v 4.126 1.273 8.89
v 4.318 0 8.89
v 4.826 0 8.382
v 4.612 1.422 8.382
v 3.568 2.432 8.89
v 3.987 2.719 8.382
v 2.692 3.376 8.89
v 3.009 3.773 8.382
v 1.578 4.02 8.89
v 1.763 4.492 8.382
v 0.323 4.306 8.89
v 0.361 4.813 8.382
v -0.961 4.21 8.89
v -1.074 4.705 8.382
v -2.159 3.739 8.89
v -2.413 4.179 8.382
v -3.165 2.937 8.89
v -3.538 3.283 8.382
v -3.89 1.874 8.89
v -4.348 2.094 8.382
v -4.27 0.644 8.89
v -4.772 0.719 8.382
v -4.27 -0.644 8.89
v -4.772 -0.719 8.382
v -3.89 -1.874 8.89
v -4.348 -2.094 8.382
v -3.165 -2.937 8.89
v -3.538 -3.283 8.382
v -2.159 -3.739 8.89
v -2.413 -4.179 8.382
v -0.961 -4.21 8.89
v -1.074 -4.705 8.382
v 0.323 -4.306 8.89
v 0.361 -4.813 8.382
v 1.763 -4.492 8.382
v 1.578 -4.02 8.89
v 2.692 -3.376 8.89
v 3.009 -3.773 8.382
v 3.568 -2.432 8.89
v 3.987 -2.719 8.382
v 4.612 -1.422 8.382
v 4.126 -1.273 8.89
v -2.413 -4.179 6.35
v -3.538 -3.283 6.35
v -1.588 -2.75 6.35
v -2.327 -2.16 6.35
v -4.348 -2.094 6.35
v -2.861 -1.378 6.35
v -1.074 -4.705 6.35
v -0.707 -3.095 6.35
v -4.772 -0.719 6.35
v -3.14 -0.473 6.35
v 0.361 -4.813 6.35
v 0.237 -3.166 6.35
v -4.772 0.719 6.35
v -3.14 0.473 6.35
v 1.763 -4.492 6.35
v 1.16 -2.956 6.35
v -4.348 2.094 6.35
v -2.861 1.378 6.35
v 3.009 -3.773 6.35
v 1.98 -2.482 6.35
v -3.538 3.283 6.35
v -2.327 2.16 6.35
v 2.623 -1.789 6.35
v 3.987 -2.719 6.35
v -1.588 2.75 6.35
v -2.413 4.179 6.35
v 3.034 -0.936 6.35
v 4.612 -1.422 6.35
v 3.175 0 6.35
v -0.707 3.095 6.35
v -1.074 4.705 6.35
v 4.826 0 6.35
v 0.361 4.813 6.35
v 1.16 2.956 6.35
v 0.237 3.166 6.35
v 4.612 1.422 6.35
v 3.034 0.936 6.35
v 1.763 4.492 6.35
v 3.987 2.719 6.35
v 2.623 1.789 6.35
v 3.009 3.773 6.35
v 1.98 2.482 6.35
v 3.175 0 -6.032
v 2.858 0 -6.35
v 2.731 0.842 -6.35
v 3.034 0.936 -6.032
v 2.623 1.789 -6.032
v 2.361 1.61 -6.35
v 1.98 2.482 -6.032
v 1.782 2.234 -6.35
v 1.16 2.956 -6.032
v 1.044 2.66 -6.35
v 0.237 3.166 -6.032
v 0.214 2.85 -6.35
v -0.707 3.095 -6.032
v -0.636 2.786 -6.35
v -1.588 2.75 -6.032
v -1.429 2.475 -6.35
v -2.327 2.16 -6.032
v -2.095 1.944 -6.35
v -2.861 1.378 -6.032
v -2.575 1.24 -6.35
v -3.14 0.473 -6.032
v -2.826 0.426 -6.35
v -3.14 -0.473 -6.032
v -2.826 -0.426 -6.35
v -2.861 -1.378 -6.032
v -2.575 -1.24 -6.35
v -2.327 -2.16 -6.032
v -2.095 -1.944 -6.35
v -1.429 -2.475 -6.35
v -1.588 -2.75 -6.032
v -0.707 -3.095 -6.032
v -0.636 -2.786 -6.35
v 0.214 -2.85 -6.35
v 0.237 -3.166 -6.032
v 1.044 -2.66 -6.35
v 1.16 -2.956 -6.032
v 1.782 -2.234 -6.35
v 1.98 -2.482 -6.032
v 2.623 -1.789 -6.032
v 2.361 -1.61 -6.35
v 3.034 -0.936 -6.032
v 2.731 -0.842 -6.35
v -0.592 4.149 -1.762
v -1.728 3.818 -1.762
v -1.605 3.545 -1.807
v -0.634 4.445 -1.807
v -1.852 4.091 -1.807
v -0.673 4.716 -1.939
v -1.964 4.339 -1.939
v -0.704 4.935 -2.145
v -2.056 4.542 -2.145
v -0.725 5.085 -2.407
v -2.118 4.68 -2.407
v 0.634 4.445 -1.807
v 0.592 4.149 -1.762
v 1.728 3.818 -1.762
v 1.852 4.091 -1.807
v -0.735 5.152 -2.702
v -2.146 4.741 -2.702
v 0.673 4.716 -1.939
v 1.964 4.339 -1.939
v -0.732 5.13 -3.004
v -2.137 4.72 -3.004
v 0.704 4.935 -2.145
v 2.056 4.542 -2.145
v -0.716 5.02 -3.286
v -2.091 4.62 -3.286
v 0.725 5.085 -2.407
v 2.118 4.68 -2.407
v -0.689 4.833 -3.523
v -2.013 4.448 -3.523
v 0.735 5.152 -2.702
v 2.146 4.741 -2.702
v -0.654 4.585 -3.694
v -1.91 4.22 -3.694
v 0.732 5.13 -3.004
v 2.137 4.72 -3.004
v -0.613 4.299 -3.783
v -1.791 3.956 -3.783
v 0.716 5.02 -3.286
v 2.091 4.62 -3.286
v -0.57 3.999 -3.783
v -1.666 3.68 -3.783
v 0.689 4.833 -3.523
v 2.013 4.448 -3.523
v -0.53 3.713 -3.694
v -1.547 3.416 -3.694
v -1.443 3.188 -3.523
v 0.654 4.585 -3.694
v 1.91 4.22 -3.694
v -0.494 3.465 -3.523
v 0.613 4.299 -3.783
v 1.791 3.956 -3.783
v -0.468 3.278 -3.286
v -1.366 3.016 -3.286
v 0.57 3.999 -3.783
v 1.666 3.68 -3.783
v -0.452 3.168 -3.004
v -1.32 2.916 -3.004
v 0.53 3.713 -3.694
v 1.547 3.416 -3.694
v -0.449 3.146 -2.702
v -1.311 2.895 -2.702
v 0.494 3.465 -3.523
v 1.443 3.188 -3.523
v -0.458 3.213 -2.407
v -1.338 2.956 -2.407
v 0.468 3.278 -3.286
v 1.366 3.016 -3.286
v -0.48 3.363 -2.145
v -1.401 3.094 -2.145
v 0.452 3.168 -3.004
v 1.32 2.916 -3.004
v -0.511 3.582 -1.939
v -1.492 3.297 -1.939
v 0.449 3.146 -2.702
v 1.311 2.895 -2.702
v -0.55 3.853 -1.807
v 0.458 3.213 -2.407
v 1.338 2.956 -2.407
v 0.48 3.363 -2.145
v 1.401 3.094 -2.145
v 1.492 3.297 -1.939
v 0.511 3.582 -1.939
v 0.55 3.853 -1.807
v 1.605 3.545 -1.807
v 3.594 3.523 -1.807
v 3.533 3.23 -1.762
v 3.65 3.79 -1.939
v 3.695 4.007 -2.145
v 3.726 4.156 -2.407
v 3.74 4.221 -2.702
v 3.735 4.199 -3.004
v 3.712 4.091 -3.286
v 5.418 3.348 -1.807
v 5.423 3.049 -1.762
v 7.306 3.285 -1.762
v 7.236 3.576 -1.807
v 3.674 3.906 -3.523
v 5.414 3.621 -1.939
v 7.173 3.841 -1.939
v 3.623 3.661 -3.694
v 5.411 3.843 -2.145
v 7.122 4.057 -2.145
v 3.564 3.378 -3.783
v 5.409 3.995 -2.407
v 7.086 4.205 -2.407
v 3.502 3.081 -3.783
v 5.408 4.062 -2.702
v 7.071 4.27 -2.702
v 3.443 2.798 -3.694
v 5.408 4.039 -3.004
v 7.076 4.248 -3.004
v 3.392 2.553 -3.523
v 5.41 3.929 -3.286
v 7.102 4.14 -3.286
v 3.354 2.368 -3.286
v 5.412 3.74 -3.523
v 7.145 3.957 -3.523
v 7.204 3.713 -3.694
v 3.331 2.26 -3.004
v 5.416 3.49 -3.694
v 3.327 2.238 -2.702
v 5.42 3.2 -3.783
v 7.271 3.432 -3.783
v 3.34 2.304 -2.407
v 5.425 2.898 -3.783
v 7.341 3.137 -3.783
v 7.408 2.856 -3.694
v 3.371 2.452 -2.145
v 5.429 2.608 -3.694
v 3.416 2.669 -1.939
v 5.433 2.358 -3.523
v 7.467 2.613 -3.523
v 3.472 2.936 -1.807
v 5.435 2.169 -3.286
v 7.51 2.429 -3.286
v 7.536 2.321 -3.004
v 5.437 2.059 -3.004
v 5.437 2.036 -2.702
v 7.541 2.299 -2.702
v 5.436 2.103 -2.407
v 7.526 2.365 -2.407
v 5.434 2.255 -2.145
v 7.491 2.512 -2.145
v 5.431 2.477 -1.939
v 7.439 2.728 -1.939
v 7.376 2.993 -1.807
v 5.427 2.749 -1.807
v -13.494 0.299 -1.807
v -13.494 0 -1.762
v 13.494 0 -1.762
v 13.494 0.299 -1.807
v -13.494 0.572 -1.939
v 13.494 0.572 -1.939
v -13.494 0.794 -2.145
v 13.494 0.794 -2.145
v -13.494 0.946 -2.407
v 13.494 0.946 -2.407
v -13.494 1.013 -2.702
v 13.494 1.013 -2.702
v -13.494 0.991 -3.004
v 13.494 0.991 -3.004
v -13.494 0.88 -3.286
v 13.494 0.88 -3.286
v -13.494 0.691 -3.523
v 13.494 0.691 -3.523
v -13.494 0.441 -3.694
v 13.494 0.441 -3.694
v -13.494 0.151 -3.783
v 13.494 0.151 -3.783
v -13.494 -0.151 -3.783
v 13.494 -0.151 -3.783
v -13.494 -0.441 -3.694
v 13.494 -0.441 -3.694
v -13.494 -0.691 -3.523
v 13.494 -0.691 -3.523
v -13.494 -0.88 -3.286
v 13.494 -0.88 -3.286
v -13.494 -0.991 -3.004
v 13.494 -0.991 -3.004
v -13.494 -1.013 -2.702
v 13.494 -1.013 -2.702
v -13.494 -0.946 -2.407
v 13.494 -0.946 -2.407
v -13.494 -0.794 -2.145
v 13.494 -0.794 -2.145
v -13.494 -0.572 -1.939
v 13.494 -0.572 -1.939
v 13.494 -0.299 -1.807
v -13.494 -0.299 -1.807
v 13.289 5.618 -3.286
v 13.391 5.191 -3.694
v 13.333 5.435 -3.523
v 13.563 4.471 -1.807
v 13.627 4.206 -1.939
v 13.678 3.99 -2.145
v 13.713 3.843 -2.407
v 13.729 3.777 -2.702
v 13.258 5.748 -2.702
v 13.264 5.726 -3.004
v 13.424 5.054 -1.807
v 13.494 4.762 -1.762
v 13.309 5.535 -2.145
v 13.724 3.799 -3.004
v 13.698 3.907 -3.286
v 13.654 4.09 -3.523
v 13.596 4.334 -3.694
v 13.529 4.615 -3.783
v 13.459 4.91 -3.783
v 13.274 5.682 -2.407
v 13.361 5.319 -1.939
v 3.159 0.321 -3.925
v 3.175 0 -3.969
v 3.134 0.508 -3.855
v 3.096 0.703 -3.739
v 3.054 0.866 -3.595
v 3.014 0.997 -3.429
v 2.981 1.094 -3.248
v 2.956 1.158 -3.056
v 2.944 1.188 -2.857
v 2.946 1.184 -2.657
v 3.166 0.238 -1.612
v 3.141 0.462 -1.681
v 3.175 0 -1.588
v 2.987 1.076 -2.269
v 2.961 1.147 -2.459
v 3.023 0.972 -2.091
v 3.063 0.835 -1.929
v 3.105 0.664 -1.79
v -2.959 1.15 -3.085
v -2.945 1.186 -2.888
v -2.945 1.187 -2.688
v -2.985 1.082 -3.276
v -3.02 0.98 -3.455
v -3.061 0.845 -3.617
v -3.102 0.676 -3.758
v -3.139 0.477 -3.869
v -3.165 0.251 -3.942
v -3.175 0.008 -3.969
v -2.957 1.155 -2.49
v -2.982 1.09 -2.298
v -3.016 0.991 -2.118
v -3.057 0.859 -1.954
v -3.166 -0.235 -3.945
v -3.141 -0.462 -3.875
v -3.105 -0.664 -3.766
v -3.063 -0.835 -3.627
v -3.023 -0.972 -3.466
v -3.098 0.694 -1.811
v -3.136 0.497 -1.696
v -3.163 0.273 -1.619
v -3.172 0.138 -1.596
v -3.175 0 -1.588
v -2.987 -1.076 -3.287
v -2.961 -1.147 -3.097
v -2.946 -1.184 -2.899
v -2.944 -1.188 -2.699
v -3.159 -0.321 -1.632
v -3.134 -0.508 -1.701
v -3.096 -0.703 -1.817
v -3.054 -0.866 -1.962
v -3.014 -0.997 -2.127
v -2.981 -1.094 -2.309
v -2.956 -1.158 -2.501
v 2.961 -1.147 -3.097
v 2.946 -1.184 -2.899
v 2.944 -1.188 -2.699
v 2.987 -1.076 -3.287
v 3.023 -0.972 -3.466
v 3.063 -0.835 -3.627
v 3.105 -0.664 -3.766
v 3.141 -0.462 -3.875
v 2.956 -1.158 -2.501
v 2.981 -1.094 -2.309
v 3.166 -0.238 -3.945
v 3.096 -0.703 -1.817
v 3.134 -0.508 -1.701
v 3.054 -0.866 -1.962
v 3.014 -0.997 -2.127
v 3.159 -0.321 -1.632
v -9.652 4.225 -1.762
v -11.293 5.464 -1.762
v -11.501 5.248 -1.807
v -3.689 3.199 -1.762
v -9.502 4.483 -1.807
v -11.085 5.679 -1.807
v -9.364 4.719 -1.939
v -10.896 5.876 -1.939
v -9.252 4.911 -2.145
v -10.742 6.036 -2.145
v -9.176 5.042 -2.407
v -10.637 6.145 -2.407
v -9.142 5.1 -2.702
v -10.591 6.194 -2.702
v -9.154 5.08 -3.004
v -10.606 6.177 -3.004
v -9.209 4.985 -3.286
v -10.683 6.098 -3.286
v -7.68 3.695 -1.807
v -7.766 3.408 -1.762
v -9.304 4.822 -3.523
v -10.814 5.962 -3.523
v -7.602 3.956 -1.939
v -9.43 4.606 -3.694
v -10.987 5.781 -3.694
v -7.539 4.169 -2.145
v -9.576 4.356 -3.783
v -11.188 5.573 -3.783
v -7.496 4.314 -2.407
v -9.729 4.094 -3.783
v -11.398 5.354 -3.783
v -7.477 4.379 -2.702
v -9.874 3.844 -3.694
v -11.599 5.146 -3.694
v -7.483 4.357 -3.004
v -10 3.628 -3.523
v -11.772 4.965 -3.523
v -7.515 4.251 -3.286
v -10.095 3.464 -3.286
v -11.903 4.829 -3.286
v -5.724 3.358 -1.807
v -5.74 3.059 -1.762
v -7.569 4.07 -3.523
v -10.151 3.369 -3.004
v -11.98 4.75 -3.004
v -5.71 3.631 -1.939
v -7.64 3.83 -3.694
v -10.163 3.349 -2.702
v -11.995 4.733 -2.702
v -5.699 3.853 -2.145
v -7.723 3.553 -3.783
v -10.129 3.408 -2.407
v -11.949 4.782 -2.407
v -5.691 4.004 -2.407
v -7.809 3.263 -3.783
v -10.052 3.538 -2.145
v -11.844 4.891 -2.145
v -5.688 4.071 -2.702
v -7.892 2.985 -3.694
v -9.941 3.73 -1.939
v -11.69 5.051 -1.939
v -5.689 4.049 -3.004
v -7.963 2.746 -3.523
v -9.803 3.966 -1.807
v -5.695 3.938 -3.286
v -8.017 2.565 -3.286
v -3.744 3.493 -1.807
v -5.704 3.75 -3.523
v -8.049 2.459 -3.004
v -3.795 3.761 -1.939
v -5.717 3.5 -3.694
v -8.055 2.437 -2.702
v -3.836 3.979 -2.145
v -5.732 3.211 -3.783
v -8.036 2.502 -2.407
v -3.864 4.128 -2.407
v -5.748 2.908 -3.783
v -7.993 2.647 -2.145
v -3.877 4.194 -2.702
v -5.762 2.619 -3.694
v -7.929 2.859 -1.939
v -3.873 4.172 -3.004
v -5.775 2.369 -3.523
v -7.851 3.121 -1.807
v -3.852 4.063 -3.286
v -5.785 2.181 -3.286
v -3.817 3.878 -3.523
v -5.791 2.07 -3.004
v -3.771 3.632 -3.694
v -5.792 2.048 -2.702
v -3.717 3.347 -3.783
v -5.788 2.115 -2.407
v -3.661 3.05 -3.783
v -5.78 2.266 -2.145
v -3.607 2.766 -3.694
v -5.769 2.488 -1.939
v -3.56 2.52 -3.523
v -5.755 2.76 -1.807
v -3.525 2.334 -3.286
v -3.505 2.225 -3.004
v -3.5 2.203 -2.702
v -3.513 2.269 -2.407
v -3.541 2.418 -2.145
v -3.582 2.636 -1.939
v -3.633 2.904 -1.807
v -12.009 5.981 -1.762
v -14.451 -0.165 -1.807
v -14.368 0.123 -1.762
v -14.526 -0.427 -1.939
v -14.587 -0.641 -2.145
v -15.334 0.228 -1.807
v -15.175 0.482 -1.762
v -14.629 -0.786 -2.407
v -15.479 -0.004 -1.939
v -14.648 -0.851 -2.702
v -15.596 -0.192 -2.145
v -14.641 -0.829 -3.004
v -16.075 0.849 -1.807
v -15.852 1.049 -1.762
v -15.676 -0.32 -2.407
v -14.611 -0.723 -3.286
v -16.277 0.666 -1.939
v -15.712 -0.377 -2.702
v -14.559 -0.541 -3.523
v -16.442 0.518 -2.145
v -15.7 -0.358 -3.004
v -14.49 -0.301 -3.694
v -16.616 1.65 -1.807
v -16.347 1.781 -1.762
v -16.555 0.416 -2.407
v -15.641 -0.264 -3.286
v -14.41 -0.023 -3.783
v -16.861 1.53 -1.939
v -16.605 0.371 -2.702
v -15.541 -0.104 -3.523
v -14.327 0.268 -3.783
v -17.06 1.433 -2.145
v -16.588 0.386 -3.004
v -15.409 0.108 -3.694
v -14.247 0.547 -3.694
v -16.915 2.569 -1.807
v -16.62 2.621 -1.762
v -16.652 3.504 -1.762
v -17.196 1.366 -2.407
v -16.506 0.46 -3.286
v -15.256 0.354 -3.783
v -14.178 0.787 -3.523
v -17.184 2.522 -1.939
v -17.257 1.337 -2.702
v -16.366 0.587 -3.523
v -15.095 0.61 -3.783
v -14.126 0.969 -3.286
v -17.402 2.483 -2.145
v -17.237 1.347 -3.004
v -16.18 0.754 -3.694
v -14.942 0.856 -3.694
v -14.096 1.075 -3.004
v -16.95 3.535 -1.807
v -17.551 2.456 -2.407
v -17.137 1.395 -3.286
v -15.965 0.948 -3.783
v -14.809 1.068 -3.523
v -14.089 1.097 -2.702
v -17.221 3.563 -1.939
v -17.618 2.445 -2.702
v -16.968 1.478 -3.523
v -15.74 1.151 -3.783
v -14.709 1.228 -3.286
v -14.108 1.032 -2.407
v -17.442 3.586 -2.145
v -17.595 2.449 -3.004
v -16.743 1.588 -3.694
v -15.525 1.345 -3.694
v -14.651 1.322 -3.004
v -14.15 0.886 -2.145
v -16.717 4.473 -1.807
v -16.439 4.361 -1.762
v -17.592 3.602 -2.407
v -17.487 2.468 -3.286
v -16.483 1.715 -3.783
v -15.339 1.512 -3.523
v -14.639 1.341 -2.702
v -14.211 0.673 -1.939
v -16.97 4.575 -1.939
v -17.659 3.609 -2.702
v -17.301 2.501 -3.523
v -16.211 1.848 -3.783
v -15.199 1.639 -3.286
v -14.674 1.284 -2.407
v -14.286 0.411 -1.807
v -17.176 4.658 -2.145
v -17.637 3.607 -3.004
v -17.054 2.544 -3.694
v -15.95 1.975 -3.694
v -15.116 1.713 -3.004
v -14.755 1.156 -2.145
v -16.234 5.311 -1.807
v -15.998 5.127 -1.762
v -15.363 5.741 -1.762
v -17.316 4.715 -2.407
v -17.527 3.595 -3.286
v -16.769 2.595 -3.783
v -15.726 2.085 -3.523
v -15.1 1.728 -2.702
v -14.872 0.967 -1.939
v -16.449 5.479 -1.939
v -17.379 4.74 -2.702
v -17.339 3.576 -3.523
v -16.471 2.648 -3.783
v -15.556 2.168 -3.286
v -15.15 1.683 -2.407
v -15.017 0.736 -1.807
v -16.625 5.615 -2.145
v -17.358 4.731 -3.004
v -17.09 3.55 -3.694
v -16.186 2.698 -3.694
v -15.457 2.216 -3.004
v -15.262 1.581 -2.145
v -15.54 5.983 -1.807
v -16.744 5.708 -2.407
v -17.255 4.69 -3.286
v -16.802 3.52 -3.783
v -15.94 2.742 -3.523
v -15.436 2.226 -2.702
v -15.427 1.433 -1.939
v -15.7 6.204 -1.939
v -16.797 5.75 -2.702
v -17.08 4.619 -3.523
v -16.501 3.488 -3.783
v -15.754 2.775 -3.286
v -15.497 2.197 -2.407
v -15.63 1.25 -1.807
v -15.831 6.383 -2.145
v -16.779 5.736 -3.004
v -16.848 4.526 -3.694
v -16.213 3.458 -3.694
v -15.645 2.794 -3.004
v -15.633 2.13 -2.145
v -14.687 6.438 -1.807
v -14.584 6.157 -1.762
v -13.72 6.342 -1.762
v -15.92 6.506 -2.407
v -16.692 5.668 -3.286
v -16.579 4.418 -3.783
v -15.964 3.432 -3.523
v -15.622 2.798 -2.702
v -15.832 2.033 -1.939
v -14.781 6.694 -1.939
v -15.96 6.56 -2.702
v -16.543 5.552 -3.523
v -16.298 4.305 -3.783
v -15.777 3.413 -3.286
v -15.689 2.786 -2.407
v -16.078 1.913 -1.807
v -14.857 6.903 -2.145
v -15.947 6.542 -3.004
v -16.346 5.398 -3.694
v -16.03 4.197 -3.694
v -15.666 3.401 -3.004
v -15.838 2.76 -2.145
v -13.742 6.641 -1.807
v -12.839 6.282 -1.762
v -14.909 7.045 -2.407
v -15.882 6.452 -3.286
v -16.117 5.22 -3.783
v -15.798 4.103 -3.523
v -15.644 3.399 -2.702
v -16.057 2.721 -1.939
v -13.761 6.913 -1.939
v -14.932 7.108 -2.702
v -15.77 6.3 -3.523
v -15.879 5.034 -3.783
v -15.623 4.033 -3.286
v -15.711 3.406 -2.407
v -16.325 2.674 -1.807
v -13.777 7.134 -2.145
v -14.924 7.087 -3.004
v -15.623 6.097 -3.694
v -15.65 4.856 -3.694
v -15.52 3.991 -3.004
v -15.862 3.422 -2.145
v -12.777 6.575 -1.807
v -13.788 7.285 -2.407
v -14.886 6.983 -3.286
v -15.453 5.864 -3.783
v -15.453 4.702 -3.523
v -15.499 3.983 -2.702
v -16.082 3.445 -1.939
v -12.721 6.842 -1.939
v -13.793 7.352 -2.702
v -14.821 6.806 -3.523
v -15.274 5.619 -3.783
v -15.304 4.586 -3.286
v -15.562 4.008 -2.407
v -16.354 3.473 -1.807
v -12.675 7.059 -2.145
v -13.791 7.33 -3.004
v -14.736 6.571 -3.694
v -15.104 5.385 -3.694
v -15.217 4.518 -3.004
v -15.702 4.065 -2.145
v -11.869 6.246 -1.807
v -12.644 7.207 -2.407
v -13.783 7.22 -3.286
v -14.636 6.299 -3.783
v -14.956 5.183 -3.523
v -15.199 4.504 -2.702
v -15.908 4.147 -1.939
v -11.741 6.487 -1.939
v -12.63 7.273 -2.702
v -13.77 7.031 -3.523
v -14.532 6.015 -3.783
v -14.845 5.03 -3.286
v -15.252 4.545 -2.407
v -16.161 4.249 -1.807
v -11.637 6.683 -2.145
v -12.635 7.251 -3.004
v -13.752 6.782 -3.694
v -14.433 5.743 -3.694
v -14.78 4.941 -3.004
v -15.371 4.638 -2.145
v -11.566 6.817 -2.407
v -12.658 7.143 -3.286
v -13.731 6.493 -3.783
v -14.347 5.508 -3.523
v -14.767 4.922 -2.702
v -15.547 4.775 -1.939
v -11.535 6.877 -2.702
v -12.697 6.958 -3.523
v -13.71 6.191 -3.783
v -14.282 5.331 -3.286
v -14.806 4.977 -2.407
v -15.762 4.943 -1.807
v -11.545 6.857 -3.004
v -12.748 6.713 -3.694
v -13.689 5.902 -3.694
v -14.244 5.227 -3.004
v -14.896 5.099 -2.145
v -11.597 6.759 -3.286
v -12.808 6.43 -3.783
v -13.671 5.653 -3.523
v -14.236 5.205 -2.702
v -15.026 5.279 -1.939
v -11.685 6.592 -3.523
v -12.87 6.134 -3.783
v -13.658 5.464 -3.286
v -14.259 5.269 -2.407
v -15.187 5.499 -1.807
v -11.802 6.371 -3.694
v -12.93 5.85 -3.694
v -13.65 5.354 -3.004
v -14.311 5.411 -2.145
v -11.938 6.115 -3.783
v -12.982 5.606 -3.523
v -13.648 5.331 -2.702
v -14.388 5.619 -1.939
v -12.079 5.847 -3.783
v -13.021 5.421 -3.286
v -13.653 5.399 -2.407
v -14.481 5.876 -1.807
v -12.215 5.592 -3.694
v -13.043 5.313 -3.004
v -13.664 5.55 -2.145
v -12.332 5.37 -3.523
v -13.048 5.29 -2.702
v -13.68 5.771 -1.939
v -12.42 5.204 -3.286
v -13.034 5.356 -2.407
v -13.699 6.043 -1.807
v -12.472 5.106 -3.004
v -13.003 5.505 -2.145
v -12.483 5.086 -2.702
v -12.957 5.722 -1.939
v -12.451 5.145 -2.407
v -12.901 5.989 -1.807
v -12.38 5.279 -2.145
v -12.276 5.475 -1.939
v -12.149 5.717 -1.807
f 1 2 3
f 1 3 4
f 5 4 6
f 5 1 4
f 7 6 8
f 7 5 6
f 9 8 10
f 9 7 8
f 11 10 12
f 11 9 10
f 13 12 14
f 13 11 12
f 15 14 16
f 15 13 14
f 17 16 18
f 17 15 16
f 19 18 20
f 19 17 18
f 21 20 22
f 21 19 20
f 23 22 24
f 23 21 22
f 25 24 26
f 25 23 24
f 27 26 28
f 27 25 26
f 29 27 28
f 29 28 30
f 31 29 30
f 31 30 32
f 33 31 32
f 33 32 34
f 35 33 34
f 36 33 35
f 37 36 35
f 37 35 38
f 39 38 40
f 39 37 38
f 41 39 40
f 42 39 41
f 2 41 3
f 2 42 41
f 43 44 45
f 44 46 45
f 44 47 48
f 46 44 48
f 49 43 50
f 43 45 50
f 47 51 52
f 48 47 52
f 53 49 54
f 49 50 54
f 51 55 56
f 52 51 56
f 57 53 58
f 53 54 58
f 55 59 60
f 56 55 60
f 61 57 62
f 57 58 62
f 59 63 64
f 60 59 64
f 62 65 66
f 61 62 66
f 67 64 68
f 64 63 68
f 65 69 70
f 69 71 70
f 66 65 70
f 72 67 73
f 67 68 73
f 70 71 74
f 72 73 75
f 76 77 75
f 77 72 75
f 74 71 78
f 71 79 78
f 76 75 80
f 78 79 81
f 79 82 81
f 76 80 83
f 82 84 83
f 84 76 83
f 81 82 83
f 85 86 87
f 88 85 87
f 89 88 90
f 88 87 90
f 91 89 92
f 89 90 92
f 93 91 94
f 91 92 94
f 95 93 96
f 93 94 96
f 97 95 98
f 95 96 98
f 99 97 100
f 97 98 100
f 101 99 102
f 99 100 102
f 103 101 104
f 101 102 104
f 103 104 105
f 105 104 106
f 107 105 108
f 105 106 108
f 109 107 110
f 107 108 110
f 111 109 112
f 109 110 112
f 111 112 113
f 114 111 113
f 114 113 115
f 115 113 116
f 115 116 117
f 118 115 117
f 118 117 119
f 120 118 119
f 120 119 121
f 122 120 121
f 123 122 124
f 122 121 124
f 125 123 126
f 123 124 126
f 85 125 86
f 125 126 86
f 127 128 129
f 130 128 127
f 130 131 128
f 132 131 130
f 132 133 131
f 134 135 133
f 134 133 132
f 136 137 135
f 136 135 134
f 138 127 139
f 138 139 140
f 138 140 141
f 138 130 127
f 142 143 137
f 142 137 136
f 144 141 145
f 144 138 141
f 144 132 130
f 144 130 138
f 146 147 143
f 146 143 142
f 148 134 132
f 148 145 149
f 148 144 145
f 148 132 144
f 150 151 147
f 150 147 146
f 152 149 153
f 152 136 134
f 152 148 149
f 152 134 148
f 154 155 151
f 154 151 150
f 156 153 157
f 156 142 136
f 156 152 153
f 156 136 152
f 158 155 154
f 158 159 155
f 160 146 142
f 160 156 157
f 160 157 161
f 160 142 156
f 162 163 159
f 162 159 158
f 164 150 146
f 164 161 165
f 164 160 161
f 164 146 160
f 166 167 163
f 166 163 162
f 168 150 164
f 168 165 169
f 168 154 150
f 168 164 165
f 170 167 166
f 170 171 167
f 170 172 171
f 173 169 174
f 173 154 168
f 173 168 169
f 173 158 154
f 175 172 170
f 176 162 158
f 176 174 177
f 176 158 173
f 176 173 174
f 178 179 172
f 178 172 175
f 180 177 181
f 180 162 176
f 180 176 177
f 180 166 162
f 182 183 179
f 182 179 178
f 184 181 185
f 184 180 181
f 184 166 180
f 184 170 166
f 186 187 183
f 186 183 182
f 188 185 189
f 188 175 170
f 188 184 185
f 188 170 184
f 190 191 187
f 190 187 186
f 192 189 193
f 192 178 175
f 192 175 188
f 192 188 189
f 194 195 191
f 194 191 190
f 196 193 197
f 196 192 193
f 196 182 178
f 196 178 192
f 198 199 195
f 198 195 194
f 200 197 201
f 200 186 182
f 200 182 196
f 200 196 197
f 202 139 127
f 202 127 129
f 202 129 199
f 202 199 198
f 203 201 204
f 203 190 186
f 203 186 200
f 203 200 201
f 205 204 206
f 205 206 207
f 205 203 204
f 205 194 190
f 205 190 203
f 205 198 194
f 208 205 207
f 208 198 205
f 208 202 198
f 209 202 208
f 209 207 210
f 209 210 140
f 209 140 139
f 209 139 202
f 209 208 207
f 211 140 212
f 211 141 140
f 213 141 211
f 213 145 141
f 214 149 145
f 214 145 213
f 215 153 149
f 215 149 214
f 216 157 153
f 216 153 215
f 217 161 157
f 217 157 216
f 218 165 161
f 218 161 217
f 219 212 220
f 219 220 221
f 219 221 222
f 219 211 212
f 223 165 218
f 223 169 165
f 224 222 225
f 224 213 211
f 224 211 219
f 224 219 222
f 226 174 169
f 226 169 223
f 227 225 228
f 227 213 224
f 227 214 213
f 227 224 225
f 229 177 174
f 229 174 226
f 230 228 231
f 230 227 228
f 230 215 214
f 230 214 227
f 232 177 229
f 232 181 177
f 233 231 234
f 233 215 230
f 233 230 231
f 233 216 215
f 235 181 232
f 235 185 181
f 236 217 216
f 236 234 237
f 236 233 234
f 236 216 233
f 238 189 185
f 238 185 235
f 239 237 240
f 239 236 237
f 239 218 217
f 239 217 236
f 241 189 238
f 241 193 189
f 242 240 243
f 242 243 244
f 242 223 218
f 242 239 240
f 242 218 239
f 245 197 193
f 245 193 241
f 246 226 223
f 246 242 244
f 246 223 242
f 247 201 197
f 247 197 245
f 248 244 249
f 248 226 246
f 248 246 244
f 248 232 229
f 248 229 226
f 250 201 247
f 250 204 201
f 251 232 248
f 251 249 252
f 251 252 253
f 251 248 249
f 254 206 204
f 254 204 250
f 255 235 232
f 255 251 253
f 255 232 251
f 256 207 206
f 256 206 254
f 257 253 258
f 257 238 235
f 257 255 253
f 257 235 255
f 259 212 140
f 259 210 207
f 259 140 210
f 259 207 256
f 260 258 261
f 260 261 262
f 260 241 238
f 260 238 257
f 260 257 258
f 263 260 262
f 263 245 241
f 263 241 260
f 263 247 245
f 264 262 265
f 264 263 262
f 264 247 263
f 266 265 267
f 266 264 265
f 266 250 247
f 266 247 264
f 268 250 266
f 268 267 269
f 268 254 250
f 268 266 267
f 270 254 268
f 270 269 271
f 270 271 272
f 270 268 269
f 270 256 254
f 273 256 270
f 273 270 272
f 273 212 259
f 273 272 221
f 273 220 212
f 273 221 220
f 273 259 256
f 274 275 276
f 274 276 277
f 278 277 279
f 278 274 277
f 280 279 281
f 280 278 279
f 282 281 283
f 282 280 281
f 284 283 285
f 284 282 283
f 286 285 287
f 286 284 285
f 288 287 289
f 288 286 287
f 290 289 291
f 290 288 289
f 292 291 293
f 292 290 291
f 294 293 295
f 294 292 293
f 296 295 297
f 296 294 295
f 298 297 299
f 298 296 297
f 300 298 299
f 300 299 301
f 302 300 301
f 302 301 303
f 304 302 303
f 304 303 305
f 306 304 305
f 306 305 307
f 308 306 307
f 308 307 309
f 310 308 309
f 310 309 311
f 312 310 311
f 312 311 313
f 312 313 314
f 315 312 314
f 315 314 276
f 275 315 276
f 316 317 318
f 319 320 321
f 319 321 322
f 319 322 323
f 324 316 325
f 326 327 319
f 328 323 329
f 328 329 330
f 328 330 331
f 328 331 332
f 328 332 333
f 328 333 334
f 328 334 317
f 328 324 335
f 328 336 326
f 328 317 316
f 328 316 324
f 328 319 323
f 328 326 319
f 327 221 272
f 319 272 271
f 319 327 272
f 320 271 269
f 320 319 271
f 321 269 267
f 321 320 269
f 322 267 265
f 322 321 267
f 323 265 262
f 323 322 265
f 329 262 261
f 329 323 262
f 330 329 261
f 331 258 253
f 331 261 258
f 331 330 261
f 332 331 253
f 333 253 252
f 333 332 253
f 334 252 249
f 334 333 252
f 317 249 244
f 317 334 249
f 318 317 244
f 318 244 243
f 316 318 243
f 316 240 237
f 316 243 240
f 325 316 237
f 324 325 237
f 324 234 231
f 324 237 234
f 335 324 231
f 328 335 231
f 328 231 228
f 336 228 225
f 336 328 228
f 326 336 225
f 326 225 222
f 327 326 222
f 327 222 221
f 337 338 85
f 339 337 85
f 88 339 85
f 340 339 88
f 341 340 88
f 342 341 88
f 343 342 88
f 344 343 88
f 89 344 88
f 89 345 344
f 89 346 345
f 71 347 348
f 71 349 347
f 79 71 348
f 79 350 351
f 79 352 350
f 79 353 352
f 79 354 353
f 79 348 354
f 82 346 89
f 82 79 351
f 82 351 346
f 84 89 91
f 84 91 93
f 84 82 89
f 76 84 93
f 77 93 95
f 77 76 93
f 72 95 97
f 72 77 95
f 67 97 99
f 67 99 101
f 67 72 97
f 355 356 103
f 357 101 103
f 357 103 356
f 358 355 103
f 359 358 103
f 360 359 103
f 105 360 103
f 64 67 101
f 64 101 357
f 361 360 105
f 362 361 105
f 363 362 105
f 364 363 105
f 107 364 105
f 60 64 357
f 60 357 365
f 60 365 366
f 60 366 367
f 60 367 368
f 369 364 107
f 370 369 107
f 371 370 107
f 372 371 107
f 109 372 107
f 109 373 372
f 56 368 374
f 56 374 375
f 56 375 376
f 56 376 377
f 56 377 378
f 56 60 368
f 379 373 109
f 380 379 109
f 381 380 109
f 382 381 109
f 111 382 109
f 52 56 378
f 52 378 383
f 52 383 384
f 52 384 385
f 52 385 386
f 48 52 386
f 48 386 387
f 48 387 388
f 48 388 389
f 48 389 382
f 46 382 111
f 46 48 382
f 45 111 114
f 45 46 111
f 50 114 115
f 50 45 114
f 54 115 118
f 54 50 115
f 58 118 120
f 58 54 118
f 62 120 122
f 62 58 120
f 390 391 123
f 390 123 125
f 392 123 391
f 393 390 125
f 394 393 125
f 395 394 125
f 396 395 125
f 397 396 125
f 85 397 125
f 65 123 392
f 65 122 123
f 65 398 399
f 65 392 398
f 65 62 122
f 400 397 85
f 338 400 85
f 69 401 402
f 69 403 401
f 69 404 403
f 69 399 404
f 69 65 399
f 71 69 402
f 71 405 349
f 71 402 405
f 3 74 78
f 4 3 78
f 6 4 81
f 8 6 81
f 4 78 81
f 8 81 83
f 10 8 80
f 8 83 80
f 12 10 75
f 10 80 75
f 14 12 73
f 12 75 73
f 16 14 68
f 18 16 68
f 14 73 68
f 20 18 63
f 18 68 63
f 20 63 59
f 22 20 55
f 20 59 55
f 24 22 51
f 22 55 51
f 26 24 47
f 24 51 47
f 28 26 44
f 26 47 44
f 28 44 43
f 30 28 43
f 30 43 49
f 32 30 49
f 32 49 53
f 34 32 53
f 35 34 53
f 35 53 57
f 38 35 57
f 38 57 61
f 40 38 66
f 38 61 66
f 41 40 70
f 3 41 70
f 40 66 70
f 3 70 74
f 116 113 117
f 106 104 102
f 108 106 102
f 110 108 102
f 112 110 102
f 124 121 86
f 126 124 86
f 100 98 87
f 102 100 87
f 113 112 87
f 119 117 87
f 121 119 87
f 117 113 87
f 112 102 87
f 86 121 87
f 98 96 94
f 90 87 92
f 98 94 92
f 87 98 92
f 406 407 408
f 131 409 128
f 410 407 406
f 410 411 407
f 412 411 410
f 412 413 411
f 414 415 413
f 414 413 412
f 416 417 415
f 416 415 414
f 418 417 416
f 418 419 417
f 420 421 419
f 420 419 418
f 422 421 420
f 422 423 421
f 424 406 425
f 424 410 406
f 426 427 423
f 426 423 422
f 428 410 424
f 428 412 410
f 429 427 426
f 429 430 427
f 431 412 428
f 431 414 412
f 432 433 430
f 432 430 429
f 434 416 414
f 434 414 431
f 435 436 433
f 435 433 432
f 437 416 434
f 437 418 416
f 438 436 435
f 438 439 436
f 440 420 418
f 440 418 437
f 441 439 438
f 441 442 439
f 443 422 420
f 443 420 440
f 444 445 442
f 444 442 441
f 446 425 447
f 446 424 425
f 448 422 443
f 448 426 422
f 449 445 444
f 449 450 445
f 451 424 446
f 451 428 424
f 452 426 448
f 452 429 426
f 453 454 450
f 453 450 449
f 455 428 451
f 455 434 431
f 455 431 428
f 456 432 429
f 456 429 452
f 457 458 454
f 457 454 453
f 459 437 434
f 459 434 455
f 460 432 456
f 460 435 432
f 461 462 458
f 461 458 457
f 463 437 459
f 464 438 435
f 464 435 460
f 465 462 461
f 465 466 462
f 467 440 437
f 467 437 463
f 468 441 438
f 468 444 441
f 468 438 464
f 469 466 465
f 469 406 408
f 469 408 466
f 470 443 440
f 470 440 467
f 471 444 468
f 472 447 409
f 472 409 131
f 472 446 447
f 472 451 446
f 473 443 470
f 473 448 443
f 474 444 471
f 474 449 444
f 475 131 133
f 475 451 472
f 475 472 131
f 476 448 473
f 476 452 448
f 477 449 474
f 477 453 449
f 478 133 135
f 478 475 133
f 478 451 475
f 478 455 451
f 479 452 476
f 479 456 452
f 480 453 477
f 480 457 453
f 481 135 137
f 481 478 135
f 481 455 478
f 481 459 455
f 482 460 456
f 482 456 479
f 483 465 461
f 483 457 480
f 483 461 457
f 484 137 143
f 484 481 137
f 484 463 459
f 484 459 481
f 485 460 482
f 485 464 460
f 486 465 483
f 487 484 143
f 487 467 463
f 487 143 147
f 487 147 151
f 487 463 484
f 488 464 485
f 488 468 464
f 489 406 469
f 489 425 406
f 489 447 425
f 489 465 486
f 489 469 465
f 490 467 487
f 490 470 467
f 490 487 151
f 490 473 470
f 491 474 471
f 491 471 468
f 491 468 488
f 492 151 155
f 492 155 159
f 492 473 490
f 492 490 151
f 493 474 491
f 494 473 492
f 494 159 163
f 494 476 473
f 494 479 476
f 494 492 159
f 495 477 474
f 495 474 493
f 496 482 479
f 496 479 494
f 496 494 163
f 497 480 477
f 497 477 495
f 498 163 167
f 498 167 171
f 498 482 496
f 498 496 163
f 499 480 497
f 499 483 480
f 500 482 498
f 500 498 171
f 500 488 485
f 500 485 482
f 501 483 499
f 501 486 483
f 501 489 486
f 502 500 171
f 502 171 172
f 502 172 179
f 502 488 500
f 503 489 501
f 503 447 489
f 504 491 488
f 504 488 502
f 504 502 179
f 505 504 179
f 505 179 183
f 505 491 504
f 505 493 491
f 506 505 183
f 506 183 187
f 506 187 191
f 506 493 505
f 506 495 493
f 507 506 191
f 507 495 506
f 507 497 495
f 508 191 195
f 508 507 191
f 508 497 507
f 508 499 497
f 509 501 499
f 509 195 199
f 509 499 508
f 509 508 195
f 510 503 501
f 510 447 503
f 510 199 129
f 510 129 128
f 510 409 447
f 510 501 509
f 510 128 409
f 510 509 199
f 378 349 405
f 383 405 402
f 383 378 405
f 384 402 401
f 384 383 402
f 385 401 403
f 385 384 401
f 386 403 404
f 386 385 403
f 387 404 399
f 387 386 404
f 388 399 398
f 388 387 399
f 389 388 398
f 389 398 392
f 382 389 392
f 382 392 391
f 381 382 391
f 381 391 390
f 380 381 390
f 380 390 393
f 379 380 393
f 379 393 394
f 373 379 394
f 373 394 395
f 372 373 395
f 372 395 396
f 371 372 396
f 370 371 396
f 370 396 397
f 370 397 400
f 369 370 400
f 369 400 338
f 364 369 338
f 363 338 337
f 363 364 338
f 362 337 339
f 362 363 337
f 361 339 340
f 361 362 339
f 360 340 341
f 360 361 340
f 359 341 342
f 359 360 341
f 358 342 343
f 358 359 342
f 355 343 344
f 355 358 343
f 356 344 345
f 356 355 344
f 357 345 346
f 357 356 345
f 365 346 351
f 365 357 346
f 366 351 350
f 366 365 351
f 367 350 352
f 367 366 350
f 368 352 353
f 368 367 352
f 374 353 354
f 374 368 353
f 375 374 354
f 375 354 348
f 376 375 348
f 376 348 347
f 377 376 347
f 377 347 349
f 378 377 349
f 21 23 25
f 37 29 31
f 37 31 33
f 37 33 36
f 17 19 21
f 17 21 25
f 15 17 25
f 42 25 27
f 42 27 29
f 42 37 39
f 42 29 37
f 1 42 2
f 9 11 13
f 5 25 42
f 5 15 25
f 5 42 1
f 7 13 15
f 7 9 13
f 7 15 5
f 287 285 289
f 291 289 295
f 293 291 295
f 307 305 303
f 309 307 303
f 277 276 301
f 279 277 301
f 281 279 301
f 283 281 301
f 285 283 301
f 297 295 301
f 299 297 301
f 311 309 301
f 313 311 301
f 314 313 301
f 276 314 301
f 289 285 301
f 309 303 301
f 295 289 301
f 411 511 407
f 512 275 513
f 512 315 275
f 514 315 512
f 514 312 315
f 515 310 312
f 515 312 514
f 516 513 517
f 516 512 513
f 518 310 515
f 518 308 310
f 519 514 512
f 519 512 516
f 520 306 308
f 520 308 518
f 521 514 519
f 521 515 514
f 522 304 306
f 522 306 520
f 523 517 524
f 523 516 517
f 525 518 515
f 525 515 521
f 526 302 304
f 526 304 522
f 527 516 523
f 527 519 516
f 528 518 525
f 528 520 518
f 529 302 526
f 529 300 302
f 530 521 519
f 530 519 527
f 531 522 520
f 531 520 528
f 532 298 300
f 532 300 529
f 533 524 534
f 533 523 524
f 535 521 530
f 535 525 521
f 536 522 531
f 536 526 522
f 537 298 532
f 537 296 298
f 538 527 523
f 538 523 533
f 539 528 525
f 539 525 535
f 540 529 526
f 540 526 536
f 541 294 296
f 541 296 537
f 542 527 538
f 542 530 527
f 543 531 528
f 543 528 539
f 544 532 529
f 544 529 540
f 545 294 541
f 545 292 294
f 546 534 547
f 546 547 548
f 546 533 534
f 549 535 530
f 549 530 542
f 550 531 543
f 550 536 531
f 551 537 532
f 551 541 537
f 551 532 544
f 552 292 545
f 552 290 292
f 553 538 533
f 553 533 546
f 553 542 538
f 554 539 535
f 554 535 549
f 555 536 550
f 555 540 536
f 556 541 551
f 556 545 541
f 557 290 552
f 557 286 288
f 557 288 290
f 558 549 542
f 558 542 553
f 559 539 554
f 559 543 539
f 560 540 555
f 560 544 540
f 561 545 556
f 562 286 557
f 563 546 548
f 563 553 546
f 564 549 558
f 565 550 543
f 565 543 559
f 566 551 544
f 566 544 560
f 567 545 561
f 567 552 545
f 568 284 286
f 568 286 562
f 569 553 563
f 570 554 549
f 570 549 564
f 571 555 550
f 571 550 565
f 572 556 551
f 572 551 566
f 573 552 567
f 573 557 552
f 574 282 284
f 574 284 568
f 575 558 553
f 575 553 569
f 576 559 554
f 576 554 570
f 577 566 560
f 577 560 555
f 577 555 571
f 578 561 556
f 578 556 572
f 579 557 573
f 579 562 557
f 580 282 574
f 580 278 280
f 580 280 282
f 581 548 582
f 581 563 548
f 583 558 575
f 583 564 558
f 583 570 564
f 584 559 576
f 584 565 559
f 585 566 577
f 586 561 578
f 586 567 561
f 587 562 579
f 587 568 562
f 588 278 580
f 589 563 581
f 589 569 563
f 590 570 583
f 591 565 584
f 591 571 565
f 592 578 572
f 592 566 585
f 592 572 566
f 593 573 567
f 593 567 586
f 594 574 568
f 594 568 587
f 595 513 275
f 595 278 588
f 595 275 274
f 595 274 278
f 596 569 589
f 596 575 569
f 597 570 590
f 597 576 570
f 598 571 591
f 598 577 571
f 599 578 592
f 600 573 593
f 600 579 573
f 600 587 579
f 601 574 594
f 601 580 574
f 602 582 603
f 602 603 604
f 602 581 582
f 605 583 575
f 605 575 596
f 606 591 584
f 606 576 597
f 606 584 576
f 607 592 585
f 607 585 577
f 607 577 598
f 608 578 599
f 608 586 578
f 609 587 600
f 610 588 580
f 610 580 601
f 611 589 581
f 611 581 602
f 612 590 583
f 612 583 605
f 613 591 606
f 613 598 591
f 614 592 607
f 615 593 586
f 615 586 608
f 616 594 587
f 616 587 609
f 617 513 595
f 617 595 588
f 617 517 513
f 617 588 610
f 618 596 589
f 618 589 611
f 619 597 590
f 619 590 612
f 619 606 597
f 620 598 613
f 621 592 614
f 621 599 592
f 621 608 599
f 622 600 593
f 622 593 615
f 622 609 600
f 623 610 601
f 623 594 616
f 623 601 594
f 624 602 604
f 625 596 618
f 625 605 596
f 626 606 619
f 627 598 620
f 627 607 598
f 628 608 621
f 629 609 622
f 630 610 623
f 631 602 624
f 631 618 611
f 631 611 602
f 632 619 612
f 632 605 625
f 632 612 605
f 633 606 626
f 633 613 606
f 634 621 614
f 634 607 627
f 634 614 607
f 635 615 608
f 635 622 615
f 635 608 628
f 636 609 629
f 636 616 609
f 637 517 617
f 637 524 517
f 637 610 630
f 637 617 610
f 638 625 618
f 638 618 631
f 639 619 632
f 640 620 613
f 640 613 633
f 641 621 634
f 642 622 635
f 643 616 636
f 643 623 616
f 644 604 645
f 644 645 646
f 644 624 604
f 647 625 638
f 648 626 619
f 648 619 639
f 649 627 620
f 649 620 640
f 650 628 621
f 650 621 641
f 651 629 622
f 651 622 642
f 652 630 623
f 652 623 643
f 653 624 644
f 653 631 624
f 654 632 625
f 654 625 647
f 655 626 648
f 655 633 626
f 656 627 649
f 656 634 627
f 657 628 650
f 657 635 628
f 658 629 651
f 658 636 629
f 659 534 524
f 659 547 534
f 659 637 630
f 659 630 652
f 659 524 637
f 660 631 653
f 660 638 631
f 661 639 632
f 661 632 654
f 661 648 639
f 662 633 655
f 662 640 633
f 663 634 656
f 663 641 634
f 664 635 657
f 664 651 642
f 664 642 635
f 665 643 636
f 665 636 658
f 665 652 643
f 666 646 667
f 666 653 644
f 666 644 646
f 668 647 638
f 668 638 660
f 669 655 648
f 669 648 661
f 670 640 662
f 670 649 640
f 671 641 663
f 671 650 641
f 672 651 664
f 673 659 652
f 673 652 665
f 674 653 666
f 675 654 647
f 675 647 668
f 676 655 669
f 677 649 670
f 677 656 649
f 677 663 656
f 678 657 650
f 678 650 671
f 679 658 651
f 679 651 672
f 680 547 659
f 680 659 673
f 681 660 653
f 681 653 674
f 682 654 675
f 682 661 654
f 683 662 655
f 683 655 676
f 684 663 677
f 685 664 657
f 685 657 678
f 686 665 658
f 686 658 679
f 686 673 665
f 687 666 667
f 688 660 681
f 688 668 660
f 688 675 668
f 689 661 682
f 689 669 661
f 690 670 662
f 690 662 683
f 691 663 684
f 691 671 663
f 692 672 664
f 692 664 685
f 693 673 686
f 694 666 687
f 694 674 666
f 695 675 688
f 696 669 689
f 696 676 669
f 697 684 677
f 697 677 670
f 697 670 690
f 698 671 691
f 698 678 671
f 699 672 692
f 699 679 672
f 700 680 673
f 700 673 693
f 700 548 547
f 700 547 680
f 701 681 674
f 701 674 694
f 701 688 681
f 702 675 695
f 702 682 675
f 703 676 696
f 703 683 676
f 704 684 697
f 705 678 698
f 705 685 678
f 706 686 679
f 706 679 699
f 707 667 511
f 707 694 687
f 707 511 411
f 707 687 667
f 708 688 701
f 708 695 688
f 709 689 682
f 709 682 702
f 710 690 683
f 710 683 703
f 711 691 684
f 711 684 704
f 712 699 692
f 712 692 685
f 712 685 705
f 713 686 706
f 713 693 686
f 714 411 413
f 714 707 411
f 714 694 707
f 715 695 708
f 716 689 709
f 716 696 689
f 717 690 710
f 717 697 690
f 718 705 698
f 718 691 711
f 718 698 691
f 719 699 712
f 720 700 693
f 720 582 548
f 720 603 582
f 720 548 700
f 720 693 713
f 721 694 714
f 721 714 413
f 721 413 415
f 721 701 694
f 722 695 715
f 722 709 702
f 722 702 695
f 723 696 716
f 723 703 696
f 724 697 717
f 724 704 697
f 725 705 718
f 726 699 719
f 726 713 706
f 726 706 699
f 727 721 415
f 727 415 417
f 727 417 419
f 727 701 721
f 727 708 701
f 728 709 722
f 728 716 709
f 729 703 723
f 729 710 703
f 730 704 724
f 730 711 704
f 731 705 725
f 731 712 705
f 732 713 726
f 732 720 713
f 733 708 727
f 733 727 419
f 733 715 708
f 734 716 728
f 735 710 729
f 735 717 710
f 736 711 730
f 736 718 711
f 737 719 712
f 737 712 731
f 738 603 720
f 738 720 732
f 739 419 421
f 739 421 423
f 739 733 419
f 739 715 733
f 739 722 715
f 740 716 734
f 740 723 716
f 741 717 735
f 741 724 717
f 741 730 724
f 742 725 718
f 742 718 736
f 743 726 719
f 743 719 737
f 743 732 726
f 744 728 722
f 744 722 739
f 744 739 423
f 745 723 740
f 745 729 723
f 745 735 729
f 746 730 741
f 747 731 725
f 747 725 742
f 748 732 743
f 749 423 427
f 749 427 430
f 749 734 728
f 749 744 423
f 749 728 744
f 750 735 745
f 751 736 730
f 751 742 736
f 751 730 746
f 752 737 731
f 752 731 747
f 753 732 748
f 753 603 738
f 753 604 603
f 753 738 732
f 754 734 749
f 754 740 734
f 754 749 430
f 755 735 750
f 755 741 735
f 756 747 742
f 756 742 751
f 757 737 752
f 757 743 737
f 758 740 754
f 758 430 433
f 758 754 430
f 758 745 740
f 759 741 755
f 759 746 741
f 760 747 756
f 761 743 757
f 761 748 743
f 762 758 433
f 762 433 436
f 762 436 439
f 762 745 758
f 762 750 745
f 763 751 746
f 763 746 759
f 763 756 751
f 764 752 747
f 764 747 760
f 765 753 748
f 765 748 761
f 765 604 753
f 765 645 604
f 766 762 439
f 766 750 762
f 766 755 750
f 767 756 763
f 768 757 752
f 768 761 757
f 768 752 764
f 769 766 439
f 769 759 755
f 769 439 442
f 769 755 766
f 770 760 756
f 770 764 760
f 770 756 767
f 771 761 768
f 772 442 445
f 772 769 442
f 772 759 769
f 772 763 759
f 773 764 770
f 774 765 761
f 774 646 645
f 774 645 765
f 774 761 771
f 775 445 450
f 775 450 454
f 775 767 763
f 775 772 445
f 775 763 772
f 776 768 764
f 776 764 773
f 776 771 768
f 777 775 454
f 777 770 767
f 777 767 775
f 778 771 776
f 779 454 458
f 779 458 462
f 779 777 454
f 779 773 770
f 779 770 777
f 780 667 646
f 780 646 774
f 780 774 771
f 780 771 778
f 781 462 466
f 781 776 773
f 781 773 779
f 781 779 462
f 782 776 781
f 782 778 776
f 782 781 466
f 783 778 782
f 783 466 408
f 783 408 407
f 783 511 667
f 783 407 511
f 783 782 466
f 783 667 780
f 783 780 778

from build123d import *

# Parameters (mm, degrees)
SKETCH1_R           = 3.175
EXTRUDE1_DEPTH      = 6.35
SKETCH2_R           = 4.826
EXTRUDE2_DEPTH      = 2.54
CHAMFER1_SIZE       = 0.508
EXTRUDE3_DEPTH      = 12.207705028
EXTRUDE3_DEPTH_BACK = 12.207705028
SKETCH3_R           = 1.190625
CHAMFER2_SIZE       = 0.3175
SKETCH7_R           = 1.016


with BuildPart() as part:
    # Sketch1 → Extrude1 (new, symmetric)
    with BuildSketch(Plane.XY):
        Circle(SKETCH1_R)
    extrude(amount=EXTRUDE1_DEPTH, both=True)

    # Sketch2 → Extrude2 (add)
    with BuildSketch(Plane.XY.offset(6.35)):
        Circle(SKETCH2_R)
    extrude(amount=EXTRUDE2_DEPTH)

    # Chamfer1
    chamfer1_edges = [part.edges().sort_by_distance(p)[0] for p in [
        (-4.826, 0, 8.89),
    ]]
    chamfer(chamfer1_edges, length=CHAMFER1_SIZE)

    # Sketch3 → Extrude3 (cut, two sides: drawn at the far end of the back side and taken through both)
    with BuildSketch(Plane(origin=(0, 0, 0), x_dir=(0, 0, -1), z_dir=(1, 0, 0)).offset(-EXTRUDE3_DEPTH_BACK)):
        with Locations(Location((2.778125, 0, 0), (0, 0, 179.999999999))):
            Circle(SKETCH3_R)
    extrude(amount=EXTRUDE3_DEPTH + EXTRUDE3_DEPTH_BACK, mode=Mode.SUBTRACT)

    # Chamfer2
    chamfer2_edges = [part.edges().sort_by_distance(p)[0] for p in [
        (-3.175, 0, -6.35),
    ]]
    chamfer(chamfer2_edges, length=CHAMFER2_SIZE)


with BuildPart() as body_2:
    # Sweep1: sweep along a path in Sketch6
    with BuildLine(Plane.XY.offset(-2.778125)) as sweep1_path:
        Line((13.49375, 0), (-13.49375, 0))
        ThreePointArc((-13.49375, 0), (-16.438801729, 4.361294783), (-11.292994408, 5.463514764))
        ThreePointArc((-11.292994408, 5.463514764), (-6.763179694, 3.173261299), (-1.728419774, 3.817989796))
        ThreePointArc((-1.728419774, 3.817989796), (0, 4.191), (1.728419774, 3.817989796))
        ThreePointArc((1.728419774, 3.817989796), (4.472851559, 3.087280395), (7.306026778, 3.28466386))
        Line((7.306026778, 3.28466386), (13.49375, 4.7625))
    # Sketch7 → Sweep1 (sweep)
    with BuildSketch(Plane(origin=(13.49375, 0, -2.778125), x_dir=(0, 0, 1), z_dir=(-1, 0, 0))):
        Circle(SKETCH7_R)
    sweep(path=sweep1_path.line)


solid = Compound([part.part, body_2.part])
